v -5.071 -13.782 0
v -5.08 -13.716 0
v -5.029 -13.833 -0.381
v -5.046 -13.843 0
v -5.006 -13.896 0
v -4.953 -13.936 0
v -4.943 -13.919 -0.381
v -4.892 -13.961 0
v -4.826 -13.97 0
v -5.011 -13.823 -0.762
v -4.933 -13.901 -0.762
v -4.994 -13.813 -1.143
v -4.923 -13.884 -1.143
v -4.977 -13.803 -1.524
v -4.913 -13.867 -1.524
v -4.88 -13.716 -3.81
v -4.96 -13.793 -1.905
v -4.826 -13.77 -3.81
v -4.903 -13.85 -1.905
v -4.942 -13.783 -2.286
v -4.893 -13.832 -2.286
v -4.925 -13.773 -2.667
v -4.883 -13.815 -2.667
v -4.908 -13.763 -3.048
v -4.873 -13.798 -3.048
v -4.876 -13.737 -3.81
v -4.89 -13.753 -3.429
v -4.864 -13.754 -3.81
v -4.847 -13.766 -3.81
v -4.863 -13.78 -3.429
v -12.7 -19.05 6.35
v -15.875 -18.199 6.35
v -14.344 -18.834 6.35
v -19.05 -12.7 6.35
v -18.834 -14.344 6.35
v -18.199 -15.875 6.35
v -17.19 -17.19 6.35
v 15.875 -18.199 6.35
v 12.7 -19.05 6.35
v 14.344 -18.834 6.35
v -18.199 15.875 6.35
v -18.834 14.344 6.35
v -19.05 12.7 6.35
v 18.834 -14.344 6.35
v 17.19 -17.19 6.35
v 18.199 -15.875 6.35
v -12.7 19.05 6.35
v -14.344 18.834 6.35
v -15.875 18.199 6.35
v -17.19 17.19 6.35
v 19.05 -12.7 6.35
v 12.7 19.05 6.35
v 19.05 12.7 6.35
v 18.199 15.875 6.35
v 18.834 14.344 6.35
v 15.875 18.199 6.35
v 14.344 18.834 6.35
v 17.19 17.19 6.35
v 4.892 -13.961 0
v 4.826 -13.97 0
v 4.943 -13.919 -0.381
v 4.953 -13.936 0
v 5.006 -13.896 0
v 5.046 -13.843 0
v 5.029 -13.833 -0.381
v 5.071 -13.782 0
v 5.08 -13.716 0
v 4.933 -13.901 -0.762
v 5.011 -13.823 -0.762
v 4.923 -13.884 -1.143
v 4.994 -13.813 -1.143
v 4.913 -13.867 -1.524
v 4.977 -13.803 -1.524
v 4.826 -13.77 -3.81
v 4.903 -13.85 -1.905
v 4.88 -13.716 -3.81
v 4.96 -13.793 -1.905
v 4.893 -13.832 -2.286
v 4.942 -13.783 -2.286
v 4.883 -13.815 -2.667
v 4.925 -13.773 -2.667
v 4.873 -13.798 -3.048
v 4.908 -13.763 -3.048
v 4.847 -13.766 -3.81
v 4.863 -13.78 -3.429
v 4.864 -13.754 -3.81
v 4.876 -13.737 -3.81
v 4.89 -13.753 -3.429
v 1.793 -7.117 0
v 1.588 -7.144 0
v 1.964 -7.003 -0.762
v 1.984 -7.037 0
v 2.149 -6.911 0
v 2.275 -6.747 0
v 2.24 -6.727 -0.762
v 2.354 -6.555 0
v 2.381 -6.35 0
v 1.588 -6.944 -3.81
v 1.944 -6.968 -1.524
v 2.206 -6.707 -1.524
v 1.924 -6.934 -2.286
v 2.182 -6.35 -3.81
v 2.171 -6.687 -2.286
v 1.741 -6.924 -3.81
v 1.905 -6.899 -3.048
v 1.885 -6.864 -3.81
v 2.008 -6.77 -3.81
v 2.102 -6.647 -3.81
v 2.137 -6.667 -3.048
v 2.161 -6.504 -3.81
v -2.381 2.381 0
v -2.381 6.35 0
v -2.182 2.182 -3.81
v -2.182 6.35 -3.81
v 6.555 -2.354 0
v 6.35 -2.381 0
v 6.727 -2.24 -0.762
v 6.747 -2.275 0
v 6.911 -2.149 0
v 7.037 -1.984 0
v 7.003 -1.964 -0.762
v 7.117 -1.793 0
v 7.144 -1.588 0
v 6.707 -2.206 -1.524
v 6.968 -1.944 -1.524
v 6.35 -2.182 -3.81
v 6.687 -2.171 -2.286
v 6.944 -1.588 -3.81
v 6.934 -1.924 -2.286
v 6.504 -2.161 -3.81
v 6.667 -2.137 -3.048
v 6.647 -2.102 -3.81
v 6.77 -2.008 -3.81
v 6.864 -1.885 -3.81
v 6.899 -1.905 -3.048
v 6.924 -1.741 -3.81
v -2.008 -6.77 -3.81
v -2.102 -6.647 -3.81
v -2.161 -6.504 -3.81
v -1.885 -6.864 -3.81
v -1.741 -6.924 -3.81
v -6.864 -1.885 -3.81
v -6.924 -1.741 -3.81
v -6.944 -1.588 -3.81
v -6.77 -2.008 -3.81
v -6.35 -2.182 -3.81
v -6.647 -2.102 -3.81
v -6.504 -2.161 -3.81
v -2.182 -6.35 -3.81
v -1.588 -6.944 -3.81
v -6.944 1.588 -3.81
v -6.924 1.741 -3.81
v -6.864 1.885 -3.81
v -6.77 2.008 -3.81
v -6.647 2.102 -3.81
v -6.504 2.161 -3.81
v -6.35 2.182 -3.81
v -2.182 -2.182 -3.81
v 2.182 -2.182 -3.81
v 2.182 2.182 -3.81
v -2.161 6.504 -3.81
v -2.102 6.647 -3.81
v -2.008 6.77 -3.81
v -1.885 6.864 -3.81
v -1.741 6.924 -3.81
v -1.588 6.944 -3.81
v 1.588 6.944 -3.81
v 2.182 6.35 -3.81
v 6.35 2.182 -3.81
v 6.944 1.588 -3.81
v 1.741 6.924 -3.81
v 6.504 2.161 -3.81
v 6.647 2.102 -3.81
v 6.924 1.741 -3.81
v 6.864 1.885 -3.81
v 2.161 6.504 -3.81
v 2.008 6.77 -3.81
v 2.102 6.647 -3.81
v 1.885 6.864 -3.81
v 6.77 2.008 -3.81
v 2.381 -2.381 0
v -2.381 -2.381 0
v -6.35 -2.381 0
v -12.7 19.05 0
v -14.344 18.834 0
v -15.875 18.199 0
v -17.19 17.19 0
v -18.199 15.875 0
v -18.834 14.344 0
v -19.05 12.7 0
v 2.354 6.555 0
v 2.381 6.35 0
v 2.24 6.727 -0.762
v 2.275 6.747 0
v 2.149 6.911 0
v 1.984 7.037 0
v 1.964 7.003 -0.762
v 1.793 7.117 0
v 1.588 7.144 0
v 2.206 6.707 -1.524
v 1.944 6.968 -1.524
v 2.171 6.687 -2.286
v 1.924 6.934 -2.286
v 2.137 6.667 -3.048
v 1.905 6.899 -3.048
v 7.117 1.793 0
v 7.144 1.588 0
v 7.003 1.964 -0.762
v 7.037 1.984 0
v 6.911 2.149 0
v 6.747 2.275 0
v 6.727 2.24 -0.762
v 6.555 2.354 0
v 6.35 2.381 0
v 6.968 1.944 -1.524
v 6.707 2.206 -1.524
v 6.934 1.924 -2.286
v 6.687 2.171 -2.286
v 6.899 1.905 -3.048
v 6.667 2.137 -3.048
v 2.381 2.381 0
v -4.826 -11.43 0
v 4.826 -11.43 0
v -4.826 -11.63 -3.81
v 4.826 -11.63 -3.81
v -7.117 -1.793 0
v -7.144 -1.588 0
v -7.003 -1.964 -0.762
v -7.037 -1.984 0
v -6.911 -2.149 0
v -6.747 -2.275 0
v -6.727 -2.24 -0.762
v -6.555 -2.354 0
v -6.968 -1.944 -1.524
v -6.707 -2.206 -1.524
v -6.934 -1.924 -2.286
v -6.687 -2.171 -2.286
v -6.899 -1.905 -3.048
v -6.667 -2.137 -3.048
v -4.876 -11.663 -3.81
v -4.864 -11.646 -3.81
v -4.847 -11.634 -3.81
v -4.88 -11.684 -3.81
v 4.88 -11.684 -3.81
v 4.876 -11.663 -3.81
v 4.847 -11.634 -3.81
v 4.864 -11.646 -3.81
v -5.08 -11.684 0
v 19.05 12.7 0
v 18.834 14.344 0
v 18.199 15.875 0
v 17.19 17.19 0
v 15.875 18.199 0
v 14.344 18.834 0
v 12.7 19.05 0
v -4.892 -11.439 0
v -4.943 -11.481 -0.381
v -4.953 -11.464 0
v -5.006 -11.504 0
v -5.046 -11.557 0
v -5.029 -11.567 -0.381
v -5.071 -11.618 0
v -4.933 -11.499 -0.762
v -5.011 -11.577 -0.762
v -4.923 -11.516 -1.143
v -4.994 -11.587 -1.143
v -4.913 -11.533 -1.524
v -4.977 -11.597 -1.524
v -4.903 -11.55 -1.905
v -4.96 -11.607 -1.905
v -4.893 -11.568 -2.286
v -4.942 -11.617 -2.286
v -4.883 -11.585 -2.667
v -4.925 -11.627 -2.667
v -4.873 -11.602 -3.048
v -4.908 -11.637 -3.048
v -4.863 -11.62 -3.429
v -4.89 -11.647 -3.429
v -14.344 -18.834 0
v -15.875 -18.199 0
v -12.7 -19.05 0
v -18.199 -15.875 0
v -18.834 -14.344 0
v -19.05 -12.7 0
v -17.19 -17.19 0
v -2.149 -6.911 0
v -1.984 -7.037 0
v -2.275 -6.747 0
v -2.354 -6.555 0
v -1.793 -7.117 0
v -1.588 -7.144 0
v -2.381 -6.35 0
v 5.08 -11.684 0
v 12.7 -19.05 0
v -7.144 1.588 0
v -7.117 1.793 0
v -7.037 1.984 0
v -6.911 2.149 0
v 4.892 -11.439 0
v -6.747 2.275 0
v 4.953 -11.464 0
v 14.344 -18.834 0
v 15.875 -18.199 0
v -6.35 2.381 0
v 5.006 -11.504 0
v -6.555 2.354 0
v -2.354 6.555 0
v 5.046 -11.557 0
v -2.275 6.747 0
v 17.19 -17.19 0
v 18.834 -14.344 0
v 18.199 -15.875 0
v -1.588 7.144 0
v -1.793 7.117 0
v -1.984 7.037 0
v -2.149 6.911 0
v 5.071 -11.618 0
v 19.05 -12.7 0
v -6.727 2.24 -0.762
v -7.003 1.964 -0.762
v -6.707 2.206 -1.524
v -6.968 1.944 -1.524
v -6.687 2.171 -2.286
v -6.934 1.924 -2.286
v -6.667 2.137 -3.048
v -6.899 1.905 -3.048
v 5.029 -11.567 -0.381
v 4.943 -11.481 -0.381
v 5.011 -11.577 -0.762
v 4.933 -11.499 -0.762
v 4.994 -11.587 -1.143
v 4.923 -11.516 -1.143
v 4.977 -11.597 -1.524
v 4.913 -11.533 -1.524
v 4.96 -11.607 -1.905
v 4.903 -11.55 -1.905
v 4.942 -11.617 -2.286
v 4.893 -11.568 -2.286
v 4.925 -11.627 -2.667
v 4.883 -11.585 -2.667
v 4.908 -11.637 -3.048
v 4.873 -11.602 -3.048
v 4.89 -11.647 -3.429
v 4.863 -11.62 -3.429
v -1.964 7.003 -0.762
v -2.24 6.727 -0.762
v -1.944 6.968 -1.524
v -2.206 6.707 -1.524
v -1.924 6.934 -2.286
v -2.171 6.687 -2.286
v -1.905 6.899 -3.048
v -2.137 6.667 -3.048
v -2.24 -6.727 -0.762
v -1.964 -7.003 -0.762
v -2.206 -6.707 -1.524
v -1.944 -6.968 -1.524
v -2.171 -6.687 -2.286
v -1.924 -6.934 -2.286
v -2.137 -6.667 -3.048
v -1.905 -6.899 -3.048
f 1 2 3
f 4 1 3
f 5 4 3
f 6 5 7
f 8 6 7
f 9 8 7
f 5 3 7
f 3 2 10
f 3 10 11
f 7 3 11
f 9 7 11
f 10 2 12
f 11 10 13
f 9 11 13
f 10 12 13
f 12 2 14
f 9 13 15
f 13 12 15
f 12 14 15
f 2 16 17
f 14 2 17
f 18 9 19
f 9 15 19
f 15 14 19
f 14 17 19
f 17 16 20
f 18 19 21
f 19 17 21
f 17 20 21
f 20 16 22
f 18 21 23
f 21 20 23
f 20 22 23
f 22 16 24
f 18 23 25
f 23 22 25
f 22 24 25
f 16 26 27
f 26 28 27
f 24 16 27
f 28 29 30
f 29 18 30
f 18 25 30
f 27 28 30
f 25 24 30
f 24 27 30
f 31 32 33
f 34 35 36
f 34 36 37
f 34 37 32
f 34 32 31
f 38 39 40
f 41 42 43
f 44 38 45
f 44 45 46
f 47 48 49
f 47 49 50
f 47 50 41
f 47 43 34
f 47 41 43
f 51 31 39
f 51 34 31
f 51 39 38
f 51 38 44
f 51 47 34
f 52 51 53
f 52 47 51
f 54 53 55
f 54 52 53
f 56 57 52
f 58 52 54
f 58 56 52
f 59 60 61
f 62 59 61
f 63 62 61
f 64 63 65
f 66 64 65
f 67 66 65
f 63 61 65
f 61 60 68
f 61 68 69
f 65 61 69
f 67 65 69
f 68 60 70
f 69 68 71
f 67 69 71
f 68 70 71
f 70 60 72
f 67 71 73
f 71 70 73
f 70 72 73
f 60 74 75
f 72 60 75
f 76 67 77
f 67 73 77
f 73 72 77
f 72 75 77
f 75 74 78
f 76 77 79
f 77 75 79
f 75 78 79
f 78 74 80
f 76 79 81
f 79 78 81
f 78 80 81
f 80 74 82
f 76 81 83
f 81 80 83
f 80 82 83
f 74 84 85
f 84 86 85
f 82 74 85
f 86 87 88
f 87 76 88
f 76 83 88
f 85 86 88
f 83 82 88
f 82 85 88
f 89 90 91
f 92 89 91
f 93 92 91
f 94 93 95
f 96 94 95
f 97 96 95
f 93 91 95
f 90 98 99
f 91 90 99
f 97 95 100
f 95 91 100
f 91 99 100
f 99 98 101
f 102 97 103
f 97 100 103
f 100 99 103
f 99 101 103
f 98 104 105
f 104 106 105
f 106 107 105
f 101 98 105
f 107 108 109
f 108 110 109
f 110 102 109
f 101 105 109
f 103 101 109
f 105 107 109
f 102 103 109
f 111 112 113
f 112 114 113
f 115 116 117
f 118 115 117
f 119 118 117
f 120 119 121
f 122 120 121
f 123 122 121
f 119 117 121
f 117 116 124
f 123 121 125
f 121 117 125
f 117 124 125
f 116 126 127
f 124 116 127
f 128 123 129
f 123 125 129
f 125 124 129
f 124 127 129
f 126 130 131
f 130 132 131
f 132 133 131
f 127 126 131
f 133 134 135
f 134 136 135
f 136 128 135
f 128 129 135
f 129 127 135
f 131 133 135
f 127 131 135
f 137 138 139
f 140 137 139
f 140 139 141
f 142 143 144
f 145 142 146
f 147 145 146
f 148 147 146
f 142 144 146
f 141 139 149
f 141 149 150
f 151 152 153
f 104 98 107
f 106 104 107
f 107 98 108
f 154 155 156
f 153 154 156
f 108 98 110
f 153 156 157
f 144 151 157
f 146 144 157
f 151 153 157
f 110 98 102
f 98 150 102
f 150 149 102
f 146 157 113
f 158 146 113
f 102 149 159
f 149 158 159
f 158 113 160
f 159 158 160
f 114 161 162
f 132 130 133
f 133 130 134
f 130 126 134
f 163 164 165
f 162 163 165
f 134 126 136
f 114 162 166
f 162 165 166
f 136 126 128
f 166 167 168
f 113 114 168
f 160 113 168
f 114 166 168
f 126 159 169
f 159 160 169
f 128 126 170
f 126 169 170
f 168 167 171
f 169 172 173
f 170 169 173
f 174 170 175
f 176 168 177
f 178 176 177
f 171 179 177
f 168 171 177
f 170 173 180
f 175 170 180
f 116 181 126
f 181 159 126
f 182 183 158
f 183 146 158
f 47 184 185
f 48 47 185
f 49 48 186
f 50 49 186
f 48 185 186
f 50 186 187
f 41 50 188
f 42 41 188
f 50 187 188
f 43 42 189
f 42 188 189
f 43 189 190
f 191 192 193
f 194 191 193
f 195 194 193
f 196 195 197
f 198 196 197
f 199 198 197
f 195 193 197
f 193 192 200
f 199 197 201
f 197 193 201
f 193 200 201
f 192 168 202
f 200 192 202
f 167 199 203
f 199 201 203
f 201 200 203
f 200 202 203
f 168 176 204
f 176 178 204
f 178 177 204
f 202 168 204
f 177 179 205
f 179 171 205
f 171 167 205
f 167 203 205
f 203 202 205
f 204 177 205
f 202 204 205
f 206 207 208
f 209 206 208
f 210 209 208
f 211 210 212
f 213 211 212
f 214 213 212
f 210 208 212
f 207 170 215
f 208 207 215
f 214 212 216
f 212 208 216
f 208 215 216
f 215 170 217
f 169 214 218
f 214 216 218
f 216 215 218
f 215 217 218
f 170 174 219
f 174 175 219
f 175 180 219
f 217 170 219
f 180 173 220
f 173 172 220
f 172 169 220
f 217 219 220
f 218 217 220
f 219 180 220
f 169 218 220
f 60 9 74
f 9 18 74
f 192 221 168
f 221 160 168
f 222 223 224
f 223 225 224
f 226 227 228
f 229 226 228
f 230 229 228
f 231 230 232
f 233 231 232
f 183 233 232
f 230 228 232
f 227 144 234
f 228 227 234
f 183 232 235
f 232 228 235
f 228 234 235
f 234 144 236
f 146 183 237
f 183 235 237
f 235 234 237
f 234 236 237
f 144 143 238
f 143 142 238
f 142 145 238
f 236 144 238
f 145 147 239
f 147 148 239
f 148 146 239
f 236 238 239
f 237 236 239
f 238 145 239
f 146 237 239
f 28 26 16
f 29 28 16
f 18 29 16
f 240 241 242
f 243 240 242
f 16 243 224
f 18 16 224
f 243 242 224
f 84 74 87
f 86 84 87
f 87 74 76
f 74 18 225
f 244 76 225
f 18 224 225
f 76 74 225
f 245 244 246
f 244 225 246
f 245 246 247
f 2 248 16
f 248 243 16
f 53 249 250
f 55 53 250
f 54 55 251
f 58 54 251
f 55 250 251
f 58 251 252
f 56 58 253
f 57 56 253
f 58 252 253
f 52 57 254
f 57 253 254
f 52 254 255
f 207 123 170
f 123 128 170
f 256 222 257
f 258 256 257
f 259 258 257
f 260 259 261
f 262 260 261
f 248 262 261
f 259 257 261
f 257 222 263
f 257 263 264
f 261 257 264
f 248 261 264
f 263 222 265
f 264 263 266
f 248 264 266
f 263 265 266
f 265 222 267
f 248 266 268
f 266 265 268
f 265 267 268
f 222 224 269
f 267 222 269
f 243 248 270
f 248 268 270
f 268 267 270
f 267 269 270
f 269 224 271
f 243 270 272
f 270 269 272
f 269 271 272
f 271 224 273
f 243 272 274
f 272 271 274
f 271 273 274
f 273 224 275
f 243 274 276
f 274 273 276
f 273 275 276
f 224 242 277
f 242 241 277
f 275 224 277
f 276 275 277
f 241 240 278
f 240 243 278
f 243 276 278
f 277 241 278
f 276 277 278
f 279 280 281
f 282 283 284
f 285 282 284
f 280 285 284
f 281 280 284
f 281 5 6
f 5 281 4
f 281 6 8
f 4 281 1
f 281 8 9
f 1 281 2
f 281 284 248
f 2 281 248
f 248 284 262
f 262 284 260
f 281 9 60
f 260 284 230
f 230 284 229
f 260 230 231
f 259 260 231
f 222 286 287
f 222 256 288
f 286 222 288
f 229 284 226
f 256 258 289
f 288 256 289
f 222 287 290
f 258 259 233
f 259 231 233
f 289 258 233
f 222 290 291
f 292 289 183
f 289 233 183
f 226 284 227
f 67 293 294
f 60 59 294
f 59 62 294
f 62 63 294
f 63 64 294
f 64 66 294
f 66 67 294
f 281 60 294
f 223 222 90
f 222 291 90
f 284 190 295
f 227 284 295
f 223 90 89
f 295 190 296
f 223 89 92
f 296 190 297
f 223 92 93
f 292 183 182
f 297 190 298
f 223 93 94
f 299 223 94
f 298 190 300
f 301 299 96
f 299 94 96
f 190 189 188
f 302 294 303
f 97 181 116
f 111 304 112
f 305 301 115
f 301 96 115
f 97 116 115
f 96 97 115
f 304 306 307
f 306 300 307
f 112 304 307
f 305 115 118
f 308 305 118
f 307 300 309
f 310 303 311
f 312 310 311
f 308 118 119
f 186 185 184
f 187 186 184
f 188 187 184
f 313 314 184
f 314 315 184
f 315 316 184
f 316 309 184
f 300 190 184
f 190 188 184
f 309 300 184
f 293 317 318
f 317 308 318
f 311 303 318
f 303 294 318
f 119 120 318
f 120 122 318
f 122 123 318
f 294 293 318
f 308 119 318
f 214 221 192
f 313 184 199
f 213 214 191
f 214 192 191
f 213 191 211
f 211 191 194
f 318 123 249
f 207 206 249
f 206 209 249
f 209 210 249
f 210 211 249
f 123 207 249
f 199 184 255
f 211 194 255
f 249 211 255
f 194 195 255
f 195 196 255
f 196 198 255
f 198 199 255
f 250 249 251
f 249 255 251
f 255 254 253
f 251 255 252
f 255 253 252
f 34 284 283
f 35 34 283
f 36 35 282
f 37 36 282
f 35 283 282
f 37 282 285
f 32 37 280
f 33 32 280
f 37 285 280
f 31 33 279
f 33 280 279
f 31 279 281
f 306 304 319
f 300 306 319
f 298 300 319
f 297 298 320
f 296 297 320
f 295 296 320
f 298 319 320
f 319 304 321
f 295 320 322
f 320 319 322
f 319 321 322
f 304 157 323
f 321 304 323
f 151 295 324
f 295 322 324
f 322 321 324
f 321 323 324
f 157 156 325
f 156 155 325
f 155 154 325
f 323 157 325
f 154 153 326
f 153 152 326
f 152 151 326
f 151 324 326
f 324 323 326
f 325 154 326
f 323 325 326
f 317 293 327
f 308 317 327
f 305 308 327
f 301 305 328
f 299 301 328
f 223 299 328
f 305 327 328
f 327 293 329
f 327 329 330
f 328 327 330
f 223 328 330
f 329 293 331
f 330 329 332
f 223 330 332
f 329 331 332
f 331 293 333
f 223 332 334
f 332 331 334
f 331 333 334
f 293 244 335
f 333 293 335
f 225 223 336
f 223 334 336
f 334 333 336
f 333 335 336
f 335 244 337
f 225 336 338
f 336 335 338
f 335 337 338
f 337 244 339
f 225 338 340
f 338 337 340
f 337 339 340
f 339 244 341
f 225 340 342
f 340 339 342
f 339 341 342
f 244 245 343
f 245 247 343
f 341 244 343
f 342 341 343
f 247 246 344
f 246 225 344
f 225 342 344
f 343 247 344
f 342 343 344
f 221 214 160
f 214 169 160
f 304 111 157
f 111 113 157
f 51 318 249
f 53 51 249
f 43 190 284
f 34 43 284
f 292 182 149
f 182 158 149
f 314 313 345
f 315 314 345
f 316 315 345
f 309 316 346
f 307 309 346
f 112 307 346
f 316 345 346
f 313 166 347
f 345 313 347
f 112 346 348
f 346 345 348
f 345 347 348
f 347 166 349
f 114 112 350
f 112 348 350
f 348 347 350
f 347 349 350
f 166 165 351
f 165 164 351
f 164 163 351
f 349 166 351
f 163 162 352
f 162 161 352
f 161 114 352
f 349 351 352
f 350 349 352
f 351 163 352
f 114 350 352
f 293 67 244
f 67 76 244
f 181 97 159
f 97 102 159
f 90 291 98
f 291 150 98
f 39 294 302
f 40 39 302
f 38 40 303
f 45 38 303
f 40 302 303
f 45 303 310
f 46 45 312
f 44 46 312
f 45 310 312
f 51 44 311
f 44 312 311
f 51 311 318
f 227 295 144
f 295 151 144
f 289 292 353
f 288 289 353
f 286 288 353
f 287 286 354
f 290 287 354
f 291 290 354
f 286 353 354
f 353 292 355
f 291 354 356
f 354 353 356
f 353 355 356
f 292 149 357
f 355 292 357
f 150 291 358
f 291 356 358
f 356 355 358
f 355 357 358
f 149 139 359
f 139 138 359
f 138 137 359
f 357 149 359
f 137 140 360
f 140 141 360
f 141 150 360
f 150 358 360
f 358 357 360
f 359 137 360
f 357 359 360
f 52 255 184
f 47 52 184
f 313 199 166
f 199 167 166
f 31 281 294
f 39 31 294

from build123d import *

# Parameters (mm, degrees)
F1_DEPTH = 6.35
F3_DEPTH = 3.81
F3_TAPER = 3


with BuildPart() as f1:
    # F0 (on Top) → F1 (new body)
    with BuildSketch(Plane.XY):
        with BuildLine():
            Line((12.7, 19.05), (-12.7, 19.05))
            ThreePointArc((-12.7, 19.05), (-17.1901280605, 17.1901280605), (-19.05, 12.7))
            Line((-19.05, 12.7), (-19.05, -12.7))
            ThreePointArc((-19.05, -12.7), (-17.1901280605, -17.1901280605), (-12.7, -19.05))
            Line((-12.7, -19.05), (12.7, -19.05))
            ThreePointArc((12.7, -19.05), (17.1901280605, -17.1901280605), (19.05, -12.7))
            Line((19.05, -12.7), (19.05, 12.7))
            ThreePointArc((19.05, 12.7), (17.1901280605, 17.1901280605), (12.7, 19.05))
        make_face()
    extrude(amount=F1_DEPTH)

    # F2 (on Top) → F3 (join)
    with BuildSketch(Plane.XY):
        with BuildLine():
            ThreePointArc((2.38125, 6.35), (2.1487660076, 6.9112660076), (1.5875, 7.14375))
            Line((1.5875, 7.14375), (-1.5875, 7.14375))
            ThreePointArc((-1.5875, 7.14375), (-2.1487660076, 6.9112660076), (-2.38125, 6.35))
            Line((-2.38125, 6.35), (-2.38125, 2.38125))
            Line((-2.38125, 2.38125), (-6.35, 2.38125))
            ThreePointArc((-6.35, 2.38125), (-6.9112660076, 2.1487660076), (-7.14375, 1.5875))
            Line((-7.14375, 1.5875), (-7.14375, -1.5875))
            ThreePointArc((-7.14375, -1.5875), (-6.9112660076, -2.1487660076), (-6.35, -2.38125))
            Line((-6.35, -2.38125), (-2.38125, -2.38125))
            Line((-2.38125, -2.38125), (-2.38125, -6.35))
            ThreePointArc((-2.38125, -6.35), (-2.1487660076, -6.9112660076), (-1.5875, -7.14375))
            Line((-1.5875, -7.14375), (1.5875, -7.14375))
            ThreePointArc((1.5875, -7.14375), (2.1487660076, -6.9112660076), (2.38125, -6.35))
            Line((2.38125, -6.35), (2.38125, -2.38125))
            Line((2.38125, -2.38125), (6.35, -2.38125))
            ThreePointArc((6.35, -2.38125), (6.9112660076, -2.1487660076), (7.14375, -1.5875))
            Line((7.14375, -1.5875), (7.14375, 1.5875))
            ThreePointArc((7.14375, 1.5875), (6.9112660076, 2.1487660076), (6.35, 2.38125))
            Line((6.35, 2.38125), (2.38125, 2.38125))
            Line((2.38125, 2.38125), (2.38125, 6.35))
        make_face()
        with BuildLine():
            ThreePointArc((5.08, -11.684), (5.0056051224, -11.5043948776), (4.826, -11.43))
            Line((4.826, -11.43), (-4.826, -11.43))
            ThreePointArc((-4.826, -11.43), (-5.0056051224, -11.5043948776), (-5.08, -11.684))
            Line((-5.08, -11.684), (-5.08, -13.716))
            ThreePointArc((-5.08, -13.716), (-5.0056051224, -13.8956051224), (-4.826, -13.97))
            Line((-4.826, -13.97), (4.826, -13.97))
            ThreePointArc((4.826, -13.97), (5.0056051224, -13.8956051224), (5.08, -13.716))
            Line((5.08, -13.716), (5.08, -11.684))
        make_face()
    extrude(amount=-F3_DEPTH, taper=F3_TAPER)


solid = f1.part
